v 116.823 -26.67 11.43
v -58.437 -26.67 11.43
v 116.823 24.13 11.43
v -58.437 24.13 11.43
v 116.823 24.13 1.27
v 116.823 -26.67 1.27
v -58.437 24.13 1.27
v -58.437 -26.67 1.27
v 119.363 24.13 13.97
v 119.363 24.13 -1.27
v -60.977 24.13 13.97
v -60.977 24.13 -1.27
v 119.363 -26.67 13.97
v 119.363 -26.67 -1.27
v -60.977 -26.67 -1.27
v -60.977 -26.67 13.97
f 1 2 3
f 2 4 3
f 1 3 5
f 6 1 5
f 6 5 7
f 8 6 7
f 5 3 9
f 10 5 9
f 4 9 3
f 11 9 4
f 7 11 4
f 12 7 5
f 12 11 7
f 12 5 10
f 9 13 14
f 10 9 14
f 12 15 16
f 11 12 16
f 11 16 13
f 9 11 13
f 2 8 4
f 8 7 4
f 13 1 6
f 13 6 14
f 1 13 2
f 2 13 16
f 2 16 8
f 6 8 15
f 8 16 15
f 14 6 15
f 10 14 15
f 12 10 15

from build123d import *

# Parameters (mm, degrees)
F0_W          = 2.54
F0_H          = 2.54
F3_W          = 2.54
F3_H          = 2.54
F8_DEPTH      = 25.4
F8_DEPTH_BACK = 25.4


with BuildPart() as f2:
    # F2: sweep along a path in F1
    with BuildLine(Plane.XZ) as f2_path:
        Line((118.0932859957, 0), (-59.7067140043, 0))
        Line((-59.7067140043, 0), (-59.7067140043, 12.7))
        Line((-59.7067140043, 12.7), (118.0932859957, 12.7))
        Line((118.0932859957, 12.7), (118.0932859957, 0))
    # F0 (on Right) → F2 (sweep)
    with BuildSketch(Plane.YZ):
        Rectangle(F0_W, F0_H)
    sweep(path=f2_path.line, transition=Transition.RIGHT)

    # F8 (add, two sides): a face of the model
    f8_faces = [f2.faces().sort_by_distance(p)[0] for p in [
        (29.1932859957, -1.27, 13.2398279808),
    ]]
    extrude(f8_faces, amount=F8_DEPTH)
    extrude(f8_faces, amount=-F8_DEPTH_BACK)


with BuildPart() as f6:
    # F6: sweep along a path in F5
    with BuildLine(Plane(origin=(0, 1.27, 0), x_dir=(-1, 0, 0), z_dir=(0, 1, 0))) as f6_path:
        Line((59.1895133257, 0), (-31.8534299731, 14.0118226409))
        Line((-31.8534299731, 14.0118226409), (-116.2539571524, 0))
    # F3 (on face) → F6 (sweep)
    with BuildSketch(Plane.XY.offset(13.97)):
        with Locations((31.7332859957, 0)):
            Rectangle(F3_W, F3_H)
    sweep(path=f6_path.line, transition=Transition.RIGHT)


solid = f2.part
